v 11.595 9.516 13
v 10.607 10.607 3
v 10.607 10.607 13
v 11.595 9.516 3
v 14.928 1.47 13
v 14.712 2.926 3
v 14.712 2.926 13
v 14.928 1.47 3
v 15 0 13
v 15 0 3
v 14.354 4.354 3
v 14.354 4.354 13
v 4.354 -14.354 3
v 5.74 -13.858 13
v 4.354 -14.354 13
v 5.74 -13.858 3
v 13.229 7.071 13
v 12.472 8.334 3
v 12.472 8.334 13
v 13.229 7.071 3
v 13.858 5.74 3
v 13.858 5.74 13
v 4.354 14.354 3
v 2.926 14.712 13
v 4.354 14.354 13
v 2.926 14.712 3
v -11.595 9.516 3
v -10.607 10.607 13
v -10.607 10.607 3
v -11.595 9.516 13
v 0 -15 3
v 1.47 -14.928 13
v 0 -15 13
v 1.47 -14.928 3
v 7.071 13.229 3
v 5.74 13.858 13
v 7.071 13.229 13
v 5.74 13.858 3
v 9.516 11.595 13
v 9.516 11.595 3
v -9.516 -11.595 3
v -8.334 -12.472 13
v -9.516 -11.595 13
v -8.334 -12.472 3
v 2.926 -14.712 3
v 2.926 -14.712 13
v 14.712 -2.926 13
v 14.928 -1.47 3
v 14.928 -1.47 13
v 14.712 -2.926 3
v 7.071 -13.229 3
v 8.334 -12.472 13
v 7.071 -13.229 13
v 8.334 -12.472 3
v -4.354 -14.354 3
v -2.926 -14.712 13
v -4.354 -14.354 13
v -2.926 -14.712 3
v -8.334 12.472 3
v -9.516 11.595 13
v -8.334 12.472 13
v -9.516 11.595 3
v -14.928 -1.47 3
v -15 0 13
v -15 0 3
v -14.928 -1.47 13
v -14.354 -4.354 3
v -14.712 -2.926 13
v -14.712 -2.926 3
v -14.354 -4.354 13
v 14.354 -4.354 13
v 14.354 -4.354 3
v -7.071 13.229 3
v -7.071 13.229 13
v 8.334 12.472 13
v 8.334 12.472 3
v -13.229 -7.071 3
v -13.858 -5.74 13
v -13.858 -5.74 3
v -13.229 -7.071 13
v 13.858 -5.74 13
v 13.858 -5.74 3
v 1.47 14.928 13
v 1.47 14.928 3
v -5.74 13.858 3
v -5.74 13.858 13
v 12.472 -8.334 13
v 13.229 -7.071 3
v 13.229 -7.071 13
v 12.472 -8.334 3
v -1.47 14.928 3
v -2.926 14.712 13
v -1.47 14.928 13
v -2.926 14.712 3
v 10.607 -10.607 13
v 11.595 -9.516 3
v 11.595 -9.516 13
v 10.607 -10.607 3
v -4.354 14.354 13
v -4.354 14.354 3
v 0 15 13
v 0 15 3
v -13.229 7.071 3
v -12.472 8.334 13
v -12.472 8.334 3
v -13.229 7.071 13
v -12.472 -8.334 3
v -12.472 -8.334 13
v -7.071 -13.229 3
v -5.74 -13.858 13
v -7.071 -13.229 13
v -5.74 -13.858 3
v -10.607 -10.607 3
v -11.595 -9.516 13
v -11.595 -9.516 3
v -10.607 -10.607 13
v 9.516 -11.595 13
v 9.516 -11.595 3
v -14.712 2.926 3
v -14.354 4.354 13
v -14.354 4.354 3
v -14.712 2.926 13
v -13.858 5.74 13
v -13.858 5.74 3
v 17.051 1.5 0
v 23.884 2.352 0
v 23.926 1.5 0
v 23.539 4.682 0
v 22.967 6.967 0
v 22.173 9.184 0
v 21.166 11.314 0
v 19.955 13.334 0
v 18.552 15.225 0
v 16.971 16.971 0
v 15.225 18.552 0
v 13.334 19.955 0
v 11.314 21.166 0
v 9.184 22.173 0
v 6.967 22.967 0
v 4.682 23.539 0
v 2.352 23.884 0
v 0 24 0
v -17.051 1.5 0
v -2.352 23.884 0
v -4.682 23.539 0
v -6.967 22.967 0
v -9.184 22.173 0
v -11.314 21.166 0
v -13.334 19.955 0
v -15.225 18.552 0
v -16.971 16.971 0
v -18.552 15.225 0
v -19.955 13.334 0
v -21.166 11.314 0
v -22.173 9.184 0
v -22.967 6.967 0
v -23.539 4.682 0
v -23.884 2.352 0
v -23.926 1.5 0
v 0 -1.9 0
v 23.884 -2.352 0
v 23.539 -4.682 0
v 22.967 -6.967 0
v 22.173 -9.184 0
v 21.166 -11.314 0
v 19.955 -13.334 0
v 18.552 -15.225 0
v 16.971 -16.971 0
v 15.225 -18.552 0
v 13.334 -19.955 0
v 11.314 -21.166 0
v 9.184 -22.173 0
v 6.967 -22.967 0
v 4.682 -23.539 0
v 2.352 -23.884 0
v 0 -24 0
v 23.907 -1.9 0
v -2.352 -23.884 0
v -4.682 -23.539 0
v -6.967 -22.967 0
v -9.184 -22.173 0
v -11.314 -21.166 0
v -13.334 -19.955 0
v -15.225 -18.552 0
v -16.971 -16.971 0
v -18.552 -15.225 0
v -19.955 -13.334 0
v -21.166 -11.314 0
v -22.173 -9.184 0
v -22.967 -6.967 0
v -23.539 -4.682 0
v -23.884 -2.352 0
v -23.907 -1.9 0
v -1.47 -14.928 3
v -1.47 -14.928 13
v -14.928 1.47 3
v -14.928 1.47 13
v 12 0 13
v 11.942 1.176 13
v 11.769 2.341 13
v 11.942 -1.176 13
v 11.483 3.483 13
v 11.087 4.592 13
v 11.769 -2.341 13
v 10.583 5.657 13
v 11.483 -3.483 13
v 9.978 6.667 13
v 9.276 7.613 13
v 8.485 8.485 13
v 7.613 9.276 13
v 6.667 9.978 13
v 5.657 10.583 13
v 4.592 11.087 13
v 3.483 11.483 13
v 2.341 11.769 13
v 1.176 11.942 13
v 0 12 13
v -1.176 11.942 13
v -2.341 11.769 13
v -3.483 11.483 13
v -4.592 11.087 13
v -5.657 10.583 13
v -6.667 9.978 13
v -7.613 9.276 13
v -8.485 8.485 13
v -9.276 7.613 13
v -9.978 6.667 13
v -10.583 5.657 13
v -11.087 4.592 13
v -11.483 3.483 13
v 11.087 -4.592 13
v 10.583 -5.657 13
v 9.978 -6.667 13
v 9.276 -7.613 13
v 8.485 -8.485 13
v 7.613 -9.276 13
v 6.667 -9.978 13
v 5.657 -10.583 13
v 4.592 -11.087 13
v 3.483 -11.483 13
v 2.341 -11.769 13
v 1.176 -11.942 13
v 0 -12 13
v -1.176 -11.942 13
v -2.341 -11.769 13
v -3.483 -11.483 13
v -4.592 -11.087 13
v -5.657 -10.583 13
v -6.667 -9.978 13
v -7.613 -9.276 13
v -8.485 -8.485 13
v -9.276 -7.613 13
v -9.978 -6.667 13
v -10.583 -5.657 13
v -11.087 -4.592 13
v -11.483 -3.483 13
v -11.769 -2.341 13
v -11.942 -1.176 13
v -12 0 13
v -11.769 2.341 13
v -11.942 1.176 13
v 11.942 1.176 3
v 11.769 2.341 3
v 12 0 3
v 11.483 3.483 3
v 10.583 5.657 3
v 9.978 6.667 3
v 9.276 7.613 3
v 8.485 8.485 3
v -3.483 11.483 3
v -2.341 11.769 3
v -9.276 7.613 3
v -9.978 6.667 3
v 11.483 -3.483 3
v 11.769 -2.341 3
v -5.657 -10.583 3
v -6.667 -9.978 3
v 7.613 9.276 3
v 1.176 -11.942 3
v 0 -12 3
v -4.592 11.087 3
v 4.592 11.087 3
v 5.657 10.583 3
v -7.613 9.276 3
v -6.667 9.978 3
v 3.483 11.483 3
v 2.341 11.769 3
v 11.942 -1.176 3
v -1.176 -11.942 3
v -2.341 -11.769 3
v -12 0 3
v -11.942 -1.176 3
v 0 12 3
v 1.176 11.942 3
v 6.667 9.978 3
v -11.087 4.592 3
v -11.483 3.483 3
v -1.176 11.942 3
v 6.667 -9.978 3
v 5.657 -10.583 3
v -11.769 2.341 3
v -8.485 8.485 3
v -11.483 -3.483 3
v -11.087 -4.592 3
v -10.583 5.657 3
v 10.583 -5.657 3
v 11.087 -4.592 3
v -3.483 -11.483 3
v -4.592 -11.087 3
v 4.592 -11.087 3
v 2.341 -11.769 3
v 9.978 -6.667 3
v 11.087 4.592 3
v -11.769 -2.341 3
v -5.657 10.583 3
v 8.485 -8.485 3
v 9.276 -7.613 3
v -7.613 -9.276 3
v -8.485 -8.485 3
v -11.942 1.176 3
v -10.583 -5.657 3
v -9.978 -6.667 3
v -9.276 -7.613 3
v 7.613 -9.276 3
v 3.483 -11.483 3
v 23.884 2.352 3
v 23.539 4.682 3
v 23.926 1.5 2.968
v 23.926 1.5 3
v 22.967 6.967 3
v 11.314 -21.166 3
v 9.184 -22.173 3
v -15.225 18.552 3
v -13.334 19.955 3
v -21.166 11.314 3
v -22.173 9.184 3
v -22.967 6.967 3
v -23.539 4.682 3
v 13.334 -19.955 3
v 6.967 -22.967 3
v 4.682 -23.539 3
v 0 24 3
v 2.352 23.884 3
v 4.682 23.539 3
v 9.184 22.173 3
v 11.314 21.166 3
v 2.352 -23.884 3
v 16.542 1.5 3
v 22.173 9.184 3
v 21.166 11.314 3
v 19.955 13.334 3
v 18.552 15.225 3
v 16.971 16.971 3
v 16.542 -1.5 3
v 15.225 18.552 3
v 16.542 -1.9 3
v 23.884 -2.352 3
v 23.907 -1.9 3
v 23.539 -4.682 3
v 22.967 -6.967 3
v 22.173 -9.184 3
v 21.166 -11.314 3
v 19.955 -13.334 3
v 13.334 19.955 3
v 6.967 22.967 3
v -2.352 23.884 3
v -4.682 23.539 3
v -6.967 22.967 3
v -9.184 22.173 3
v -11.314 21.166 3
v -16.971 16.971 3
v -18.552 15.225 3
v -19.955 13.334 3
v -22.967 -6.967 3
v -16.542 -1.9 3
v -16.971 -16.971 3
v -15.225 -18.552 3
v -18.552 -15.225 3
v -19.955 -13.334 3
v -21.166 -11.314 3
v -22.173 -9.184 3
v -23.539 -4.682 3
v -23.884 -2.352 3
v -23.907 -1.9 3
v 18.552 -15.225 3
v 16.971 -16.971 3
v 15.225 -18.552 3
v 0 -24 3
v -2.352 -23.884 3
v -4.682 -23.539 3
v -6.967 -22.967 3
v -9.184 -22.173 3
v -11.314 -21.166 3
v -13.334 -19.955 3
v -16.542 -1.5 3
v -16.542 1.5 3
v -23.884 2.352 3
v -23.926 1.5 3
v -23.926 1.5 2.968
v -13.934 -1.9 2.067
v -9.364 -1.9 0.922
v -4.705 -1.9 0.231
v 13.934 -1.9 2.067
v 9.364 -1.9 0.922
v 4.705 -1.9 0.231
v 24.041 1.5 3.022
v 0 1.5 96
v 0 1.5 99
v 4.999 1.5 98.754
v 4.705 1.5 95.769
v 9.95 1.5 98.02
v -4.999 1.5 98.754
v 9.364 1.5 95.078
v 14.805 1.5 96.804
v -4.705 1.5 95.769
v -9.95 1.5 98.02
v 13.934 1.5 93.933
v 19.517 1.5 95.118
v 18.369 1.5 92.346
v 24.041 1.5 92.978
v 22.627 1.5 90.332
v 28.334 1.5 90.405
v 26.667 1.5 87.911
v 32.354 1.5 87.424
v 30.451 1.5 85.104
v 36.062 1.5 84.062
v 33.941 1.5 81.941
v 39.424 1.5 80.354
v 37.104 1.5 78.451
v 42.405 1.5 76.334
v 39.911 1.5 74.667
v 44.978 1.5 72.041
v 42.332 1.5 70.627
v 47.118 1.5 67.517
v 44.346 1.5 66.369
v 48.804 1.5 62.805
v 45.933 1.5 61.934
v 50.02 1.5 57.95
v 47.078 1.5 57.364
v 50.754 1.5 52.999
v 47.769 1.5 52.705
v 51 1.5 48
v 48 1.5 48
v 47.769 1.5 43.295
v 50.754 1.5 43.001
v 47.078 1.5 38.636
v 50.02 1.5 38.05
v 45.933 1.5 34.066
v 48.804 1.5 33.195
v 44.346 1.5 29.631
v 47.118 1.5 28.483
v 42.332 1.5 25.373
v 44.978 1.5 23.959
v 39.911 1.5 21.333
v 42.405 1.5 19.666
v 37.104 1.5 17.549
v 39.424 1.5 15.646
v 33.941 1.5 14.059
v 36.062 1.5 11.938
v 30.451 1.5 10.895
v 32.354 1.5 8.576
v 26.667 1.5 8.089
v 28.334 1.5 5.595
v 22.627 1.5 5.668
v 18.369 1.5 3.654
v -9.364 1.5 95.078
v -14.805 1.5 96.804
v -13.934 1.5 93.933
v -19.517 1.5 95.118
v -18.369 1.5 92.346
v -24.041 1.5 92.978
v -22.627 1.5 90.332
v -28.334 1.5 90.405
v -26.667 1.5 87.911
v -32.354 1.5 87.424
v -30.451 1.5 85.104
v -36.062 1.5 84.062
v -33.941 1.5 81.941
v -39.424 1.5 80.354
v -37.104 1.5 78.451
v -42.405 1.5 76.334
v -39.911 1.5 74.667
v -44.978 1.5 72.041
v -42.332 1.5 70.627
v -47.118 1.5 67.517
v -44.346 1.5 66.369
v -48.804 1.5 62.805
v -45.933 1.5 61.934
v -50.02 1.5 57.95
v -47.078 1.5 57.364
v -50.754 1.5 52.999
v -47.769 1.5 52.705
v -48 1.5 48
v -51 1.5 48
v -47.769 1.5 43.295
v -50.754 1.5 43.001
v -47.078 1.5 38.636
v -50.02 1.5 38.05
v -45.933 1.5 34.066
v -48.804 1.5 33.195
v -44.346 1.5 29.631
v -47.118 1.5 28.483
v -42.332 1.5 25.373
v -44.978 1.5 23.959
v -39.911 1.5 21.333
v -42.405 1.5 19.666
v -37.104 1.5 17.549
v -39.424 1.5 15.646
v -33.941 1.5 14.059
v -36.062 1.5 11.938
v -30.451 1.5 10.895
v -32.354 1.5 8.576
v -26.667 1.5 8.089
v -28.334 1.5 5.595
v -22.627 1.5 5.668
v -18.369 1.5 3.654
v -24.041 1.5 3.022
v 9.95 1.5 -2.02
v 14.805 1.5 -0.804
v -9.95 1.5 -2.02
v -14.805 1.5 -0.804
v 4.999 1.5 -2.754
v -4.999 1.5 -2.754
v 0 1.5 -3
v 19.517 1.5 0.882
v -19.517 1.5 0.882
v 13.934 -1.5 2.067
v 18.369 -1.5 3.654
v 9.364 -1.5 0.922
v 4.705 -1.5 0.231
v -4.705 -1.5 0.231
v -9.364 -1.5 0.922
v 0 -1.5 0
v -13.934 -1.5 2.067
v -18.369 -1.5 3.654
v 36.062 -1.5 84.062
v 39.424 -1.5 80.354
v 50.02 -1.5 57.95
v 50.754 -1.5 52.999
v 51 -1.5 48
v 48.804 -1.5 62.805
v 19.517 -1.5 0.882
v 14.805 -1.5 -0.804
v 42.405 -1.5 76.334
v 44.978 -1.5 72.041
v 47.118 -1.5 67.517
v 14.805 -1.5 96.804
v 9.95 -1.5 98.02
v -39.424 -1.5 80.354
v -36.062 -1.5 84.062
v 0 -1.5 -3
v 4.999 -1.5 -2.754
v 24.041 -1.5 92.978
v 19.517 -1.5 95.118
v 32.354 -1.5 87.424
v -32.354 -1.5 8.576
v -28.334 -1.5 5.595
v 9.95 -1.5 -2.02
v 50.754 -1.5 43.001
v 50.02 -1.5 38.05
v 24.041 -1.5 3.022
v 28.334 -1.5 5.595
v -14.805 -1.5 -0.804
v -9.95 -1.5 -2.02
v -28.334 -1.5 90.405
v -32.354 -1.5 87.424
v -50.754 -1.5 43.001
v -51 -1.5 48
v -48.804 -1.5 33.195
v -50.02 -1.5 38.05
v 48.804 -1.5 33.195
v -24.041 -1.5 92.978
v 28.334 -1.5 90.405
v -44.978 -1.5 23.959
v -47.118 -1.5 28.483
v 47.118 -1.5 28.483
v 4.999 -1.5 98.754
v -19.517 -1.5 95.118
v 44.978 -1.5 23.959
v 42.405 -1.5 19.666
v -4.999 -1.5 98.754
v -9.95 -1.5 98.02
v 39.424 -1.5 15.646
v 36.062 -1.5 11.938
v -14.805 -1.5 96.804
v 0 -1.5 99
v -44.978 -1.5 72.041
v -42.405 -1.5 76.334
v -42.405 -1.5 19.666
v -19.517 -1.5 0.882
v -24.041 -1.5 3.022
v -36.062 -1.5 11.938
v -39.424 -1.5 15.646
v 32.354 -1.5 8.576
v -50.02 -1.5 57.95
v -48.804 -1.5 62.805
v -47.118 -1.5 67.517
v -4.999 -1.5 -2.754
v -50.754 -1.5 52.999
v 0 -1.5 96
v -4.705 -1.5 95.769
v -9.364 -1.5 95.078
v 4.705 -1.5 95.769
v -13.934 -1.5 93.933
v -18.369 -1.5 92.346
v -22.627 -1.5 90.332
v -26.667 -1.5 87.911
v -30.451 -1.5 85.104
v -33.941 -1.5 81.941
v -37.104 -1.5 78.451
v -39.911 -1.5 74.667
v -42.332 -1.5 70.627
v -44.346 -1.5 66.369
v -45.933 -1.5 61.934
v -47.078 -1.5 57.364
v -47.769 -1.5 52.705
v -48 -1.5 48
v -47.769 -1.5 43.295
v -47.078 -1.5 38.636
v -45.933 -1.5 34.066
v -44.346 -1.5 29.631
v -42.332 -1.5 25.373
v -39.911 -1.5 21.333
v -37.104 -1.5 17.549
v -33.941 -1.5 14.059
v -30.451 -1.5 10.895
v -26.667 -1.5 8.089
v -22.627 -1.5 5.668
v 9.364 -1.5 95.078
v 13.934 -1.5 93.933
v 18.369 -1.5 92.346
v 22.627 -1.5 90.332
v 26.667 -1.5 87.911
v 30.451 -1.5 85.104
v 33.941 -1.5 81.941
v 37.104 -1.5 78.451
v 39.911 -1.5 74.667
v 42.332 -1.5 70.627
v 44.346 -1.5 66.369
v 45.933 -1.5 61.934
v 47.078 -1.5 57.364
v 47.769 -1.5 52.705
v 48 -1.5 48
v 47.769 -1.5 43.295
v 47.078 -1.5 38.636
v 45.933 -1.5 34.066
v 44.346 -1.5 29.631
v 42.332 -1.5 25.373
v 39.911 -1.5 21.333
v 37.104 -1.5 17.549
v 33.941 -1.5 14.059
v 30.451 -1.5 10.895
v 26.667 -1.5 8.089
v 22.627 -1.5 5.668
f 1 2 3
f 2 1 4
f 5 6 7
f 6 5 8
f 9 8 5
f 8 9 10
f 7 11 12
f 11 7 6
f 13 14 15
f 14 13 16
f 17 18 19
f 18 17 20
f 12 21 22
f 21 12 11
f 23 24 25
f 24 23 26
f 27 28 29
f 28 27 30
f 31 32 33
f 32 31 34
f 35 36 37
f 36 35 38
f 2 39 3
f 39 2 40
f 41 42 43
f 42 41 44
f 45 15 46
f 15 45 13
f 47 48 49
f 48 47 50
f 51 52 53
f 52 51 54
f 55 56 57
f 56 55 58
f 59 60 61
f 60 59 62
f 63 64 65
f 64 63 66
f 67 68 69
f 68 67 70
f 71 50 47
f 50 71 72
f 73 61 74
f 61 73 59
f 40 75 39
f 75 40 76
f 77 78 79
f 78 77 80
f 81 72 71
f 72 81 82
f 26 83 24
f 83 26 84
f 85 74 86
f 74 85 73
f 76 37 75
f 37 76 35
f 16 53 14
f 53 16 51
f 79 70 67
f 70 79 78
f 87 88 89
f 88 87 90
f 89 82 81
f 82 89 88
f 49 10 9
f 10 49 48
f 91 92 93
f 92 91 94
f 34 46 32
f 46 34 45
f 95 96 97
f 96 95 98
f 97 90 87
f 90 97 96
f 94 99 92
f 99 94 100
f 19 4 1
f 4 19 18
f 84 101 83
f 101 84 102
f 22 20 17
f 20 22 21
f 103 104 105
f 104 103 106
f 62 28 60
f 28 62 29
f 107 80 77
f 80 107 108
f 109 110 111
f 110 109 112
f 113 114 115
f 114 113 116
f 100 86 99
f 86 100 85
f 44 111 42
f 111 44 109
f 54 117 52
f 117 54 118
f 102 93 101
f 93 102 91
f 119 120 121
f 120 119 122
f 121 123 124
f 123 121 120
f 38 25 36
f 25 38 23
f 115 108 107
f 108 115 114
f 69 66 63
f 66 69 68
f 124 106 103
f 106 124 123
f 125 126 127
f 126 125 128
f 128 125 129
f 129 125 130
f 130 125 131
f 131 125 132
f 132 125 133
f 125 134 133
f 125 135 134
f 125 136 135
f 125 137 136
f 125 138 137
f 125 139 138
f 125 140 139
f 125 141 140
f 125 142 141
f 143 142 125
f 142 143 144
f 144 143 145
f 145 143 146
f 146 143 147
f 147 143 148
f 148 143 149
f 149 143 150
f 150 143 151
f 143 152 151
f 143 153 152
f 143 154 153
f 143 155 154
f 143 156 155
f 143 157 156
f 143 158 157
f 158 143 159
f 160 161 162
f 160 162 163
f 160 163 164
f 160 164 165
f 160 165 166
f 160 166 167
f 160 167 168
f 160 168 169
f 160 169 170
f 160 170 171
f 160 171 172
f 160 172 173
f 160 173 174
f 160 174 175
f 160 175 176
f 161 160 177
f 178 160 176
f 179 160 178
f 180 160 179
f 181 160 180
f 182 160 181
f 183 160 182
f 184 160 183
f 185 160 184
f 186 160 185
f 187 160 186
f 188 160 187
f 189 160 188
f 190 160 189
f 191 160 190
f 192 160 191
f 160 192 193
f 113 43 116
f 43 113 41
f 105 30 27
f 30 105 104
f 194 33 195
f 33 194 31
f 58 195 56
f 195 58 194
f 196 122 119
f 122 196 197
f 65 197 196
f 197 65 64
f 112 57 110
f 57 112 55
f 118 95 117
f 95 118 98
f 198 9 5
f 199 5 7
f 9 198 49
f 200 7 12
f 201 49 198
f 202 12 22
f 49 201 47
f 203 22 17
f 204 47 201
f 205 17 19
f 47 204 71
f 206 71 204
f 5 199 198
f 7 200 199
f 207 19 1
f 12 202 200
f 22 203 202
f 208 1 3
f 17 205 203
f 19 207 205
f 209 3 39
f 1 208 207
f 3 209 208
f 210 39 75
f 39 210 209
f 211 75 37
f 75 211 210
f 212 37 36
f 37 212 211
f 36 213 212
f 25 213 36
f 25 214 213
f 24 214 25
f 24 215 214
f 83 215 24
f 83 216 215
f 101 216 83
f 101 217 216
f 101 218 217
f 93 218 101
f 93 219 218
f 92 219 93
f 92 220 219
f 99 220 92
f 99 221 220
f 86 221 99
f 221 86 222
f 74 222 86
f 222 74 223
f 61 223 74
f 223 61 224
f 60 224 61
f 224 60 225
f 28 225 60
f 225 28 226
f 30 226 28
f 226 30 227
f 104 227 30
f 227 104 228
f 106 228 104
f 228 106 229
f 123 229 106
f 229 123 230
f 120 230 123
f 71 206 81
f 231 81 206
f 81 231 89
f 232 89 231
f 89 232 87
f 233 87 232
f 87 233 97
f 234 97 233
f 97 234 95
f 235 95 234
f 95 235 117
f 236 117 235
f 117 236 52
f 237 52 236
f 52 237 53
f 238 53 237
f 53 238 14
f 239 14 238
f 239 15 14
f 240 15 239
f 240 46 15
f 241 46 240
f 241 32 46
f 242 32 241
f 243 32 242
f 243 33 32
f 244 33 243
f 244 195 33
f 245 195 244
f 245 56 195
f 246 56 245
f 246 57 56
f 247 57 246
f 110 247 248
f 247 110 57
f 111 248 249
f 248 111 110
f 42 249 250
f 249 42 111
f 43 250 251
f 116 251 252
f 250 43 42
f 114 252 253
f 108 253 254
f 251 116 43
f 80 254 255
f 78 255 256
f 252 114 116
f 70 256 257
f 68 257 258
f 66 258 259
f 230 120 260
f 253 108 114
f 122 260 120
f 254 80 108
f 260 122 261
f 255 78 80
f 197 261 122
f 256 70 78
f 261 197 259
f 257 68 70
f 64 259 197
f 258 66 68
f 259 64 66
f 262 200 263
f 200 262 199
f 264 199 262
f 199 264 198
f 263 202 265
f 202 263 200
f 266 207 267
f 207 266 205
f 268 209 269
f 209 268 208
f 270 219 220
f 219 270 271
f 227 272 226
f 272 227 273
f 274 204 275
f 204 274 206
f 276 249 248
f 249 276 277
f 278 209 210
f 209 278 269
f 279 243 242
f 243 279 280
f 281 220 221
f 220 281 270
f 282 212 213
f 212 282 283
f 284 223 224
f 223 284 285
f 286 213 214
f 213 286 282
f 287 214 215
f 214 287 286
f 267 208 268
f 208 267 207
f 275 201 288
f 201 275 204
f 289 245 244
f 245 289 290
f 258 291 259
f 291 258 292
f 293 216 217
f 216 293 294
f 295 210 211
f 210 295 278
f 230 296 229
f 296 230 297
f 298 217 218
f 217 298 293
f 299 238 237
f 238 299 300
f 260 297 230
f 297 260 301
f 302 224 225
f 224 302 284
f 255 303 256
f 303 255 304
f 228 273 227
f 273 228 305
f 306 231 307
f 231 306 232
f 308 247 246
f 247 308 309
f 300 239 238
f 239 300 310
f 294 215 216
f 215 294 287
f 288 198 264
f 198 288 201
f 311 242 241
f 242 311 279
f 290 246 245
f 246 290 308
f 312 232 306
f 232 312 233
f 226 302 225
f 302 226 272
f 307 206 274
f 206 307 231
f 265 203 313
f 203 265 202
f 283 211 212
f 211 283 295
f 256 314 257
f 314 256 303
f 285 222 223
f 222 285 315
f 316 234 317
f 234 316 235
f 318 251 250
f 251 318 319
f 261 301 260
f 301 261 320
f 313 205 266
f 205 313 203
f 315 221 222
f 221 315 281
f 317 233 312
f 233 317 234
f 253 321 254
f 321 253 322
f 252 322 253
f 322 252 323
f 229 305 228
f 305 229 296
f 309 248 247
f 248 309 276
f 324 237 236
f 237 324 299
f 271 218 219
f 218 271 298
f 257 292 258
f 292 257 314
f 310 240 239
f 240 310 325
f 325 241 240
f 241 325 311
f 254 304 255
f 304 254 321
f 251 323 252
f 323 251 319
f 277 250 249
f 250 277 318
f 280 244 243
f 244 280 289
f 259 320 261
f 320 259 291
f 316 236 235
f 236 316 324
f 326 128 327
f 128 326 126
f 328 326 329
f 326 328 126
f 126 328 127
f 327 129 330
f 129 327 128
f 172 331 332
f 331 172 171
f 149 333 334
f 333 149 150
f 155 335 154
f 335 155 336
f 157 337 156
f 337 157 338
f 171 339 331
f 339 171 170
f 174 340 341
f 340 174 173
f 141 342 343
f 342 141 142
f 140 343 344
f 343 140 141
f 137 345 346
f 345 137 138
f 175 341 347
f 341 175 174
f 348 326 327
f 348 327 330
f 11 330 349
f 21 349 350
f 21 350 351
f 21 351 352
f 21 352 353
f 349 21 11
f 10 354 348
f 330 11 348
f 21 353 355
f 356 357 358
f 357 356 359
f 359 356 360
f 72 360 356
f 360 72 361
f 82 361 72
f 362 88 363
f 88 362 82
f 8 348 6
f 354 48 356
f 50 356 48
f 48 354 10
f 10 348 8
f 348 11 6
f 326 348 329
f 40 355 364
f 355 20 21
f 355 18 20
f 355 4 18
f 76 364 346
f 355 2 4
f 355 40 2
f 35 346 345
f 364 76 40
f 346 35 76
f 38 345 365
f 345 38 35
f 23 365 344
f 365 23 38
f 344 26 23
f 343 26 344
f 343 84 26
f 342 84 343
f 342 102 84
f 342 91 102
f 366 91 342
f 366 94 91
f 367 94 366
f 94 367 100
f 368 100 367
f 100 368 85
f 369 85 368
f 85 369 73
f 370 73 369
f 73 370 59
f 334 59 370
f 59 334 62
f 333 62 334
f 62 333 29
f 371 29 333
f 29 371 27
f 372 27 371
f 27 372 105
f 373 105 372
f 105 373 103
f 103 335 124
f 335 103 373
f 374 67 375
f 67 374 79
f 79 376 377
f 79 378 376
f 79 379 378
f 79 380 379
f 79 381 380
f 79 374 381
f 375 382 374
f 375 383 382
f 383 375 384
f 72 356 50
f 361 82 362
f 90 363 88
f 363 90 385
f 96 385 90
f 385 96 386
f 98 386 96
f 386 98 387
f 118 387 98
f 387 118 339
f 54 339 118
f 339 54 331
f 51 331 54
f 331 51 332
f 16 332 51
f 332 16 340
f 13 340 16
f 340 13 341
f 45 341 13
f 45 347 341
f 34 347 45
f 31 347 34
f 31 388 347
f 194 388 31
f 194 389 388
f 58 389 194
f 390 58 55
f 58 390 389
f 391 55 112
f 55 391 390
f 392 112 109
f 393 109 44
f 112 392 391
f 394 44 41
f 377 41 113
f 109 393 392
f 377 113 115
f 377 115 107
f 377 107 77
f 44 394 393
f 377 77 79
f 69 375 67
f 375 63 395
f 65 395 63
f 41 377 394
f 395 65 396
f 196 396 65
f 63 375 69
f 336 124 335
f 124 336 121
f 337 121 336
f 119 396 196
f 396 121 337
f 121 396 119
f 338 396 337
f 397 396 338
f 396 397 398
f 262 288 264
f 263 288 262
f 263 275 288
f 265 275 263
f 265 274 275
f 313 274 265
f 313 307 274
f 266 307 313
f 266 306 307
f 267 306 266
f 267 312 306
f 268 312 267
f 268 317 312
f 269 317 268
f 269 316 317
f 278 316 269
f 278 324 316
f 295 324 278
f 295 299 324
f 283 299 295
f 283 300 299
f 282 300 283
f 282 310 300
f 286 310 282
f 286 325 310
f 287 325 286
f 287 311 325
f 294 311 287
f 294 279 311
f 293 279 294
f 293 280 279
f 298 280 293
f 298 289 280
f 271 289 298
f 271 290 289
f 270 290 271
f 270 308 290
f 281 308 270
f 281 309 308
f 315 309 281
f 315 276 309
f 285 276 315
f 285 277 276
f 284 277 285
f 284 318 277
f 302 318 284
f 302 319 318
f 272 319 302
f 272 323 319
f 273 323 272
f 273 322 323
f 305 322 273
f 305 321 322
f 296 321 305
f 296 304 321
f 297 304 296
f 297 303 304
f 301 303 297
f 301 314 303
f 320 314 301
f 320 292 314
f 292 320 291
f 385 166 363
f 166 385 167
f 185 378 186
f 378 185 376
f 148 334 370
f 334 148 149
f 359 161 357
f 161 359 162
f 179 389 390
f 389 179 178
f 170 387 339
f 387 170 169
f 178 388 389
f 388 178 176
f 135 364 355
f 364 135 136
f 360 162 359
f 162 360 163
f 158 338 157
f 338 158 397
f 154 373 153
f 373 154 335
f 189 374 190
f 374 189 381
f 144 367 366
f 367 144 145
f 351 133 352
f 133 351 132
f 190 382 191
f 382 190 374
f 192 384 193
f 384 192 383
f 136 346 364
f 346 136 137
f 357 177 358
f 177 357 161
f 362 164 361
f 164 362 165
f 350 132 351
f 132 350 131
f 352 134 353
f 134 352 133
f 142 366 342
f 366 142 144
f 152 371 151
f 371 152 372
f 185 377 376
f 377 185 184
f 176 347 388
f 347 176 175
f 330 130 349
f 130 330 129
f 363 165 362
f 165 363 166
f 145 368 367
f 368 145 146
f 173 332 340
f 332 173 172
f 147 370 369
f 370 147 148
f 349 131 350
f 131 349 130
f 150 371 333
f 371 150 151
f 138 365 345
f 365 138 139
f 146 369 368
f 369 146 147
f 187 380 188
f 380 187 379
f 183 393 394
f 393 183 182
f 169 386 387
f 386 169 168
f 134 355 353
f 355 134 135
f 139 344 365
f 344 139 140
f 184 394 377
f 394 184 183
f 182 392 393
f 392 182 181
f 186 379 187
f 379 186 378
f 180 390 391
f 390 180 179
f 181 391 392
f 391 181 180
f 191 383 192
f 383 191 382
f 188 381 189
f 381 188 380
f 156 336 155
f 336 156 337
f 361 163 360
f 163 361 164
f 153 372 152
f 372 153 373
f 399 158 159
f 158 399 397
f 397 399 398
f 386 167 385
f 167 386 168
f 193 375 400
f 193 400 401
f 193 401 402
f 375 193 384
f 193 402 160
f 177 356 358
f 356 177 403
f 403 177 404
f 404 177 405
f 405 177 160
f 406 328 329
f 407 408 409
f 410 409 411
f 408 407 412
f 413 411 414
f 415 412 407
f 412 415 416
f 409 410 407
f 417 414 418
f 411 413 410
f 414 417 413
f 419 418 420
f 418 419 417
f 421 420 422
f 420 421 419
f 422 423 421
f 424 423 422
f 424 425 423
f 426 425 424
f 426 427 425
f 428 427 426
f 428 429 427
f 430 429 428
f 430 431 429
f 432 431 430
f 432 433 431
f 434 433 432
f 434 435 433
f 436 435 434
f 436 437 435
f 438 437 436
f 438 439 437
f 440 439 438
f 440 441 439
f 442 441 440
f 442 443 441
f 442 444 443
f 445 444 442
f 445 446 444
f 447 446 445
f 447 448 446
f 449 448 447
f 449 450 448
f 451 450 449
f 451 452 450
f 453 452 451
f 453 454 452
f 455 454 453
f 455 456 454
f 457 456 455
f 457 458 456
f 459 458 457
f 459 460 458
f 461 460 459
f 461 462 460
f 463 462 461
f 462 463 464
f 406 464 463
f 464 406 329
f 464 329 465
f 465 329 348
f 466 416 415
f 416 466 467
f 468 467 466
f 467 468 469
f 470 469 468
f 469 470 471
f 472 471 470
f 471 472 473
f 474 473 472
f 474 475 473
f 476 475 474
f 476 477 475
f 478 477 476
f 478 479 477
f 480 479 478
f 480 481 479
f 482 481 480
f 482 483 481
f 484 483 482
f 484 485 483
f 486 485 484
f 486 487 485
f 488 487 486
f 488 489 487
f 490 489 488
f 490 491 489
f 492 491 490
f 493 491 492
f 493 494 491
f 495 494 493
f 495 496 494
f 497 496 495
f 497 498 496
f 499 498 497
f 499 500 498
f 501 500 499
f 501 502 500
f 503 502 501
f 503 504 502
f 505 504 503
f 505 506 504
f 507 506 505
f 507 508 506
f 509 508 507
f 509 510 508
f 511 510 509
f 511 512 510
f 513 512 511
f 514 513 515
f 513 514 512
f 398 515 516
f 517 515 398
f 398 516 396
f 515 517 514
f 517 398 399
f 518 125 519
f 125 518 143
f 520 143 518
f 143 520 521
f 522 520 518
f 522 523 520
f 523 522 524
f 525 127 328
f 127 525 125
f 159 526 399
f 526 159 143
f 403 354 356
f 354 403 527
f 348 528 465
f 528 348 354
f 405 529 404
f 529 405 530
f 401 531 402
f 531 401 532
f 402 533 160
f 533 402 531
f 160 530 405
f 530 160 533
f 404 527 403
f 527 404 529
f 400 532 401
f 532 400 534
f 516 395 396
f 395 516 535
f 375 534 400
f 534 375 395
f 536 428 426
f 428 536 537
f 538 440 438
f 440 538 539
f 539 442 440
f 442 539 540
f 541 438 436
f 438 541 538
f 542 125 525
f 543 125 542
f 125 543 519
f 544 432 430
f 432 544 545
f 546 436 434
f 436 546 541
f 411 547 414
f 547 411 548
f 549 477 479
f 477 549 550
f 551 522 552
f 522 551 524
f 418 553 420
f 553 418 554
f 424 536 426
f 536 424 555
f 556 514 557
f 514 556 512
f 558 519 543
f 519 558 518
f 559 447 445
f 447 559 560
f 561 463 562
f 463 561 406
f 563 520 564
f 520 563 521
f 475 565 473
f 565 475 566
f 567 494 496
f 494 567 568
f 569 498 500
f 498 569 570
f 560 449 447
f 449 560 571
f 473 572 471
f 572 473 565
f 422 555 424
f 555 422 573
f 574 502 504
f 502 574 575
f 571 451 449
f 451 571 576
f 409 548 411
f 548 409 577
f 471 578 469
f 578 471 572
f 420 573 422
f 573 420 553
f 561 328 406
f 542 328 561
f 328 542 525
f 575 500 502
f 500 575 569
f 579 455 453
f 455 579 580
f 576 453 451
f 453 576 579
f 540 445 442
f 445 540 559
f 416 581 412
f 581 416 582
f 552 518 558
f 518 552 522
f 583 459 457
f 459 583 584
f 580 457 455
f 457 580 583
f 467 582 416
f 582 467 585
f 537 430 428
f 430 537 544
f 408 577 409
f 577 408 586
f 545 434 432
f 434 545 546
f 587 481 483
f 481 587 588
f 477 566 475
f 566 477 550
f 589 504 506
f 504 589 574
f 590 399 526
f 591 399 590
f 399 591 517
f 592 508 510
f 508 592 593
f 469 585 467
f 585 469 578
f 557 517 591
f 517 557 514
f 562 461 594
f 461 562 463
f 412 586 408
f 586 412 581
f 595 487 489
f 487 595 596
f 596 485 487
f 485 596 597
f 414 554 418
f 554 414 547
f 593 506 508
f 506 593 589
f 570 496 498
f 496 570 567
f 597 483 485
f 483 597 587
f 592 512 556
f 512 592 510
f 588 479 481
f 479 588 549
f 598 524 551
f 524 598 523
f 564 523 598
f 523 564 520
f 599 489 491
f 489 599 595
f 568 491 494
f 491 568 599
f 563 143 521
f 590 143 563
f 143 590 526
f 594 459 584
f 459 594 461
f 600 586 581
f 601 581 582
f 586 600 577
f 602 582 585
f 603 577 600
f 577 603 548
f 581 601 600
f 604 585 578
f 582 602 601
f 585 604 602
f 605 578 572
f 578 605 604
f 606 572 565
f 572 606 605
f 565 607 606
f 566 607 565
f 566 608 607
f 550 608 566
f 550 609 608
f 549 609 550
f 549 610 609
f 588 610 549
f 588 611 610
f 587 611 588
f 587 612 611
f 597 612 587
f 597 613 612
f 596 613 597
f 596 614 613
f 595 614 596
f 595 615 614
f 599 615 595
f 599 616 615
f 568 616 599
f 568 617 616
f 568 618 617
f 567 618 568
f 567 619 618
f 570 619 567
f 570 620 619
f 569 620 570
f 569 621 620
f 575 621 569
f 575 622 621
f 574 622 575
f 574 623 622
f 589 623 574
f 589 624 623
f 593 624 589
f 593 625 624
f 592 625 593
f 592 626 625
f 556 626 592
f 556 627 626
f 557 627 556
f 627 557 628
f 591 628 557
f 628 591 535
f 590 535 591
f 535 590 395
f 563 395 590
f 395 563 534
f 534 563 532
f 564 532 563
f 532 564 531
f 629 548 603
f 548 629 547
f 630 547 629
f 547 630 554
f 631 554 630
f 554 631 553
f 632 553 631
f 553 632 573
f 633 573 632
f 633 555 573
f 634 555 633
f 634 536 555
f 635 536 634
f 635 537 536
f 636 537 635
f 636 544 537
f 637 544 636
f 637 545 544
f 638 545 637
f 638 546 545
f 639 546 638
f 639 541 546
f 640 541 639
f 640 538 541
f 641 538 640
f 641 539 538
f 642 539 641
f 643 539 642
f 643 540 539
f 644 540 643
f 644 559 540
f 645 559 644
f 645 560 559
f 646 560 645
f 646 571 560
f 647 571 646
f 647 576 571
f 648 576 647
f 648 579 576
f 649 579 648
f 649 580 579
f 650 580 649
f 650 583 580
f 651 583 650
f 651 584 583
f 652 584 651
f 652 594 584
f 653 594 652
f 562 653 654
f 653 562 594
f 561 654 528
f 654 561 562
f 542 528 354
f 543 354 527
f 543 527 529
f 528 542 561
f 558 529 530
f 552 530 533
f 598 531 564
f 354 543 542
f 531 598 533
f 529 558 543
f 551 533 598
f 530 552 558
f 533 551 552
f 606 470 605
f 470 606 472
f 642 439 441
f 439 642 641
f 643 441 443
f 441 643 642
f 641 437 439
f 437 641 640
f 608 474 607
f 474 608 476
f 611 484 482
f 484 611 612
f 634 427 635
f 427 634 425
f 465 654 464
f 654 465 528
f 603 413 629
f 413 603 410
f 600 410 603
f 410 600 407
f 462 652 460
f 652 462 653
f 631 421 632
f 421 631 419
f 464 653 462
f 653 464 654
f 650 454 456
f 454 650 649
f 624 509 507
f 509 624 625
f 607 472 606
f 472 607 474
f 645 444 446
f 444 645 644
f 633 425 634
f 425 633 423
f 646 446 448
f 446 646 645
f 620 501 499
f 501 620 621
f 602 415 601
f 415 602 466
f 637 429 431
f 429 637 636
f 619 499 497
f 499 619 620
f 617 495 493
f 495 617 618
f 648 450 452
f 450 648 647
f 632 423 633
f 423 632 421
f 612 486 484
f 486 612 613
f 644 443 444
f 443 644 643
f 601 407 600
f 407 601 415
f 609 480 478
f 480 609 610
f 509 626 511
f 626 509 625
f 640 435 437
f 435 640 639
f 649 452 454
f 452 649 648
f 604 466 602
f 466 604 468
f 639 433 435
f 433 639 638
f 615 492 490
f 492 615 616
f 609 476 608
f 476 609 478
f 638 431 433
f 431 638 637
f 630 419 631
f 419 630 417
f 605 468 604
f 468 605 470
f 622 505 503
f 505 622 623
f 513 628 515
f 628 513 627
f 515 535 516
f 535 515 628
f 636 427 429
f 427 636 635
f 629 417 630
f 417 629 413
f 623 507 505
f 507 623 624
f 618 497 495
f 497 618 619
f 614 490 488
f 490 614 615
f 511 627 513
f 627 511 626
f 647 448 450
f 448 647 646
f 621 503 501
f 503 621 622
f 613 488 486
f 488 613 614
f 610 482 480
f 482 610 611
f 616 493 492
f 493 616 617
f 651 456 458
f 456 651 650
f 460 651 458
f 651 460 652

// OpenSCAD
// Diameter of plant base
plantD = 24;
plantR=plantD/2;
// Diameter of platform
outerD = 48;
// Diameter of largest hoop
hoopD = 96; 
// Number of Hoops
numHoops = 1; //[1,2]
// Thickness of hoops, base, etc.
thick=3;
// Height of plant stand
height=10;
// Diameter of hooks on links
linkD = 10;
// Length of links (for hanging)
linkLen = 200;
// Gap between assembled parts (0 is very tight, 0.4 = loose)
gap=0.4;
// Part to show
part= 0; //[0:Assembled, 1:Plated, 2:Base, 3:Large hoop, 4: Small hoop, 5:Link, 6: Links Plated]

/* [Hidden] */

$fn=64;

outerR=outerD/2;
linkR = linkD/2;
hoopR = hoopD/2;

module base() {
	difference() { 
	   union() {
			difference() {
				cylinder(r=plantR+thick, h=height+thick);
				translate([0,0,-1]) cylinder(r=plantR, h=height+thick+2);
				}
			cylinder(r=outerR, h=thick);
			}
		hoopPositioned(hoopR, gap) ;
		if (numHoops==2) rotate([0,0,90]) hoopPositioned(hoopR-thick-gap, gap) ;
		//translate([0,0,-thick]) cylinder(r=outerR+thick,h=thick);
		}
	}

module holder() {
	difference() {
		cube([3*thick,3*thick,height], center=true);
		cube([thick,thick,height+1], center=true);
		}
	}

module hoopPositioned(r, g) {
	translate([0,thick/2,hoopR+thick-thick]) rotate([90,0,0]) 
		hoop(r, g);
	}

// hoop radius r
// if g>0 then we're making a hole for a hoop, with gap g

module hoop(r, g) {
	difference() {
		if (g>0) {
			cylinder(r=r+3*thick+g, h=thick+g);
			}
		else {
			cylinder(r=r+thick+g, h=thick+g);
			}
		translate([0,0,-1]) cylinder(r=r, h=thick+2);
		}
	}

module link() {
	difference() {
	union() {
		hoop(linkR,0);
		translate([linkLen,0,0]) hoop(linkR,0);
		}
	translate([0,-linkR, -1]) 
		cube([linkLen,linkR,thick+2]);
	}
	translate([0,-linkR-thick,0]) cube([linkLen,thick,thick]);
	}

module linkPlate() {
	spacing = linkD+3*thick;
	for (y = [-2*spacing:spacing:2*spacing]) {
		translate([-linkLen/2,y,0]) link();
		}
	}

module assembled() {
	base();
	hoopPositioned(hoopR, 0);
	if (numHoops==2) rotate([0,0,90]) hoopPositioned(hoopR-thick-2*gap, 0);
	}

module plated() {
	base();
	hoop(hoopR, 0);
	if (numHoops==2) hoop(hoopR-thick-2*gap, 0);
	}

if (part==0) assembled();
if (part==1) plated();
if (part==2) base();
if (part==3) hoop(hoopR, 0);
if (part==4) hoop(hoopR-thick-gap, 0);
if (part==5) link();
if (part==6) linkPlate();
